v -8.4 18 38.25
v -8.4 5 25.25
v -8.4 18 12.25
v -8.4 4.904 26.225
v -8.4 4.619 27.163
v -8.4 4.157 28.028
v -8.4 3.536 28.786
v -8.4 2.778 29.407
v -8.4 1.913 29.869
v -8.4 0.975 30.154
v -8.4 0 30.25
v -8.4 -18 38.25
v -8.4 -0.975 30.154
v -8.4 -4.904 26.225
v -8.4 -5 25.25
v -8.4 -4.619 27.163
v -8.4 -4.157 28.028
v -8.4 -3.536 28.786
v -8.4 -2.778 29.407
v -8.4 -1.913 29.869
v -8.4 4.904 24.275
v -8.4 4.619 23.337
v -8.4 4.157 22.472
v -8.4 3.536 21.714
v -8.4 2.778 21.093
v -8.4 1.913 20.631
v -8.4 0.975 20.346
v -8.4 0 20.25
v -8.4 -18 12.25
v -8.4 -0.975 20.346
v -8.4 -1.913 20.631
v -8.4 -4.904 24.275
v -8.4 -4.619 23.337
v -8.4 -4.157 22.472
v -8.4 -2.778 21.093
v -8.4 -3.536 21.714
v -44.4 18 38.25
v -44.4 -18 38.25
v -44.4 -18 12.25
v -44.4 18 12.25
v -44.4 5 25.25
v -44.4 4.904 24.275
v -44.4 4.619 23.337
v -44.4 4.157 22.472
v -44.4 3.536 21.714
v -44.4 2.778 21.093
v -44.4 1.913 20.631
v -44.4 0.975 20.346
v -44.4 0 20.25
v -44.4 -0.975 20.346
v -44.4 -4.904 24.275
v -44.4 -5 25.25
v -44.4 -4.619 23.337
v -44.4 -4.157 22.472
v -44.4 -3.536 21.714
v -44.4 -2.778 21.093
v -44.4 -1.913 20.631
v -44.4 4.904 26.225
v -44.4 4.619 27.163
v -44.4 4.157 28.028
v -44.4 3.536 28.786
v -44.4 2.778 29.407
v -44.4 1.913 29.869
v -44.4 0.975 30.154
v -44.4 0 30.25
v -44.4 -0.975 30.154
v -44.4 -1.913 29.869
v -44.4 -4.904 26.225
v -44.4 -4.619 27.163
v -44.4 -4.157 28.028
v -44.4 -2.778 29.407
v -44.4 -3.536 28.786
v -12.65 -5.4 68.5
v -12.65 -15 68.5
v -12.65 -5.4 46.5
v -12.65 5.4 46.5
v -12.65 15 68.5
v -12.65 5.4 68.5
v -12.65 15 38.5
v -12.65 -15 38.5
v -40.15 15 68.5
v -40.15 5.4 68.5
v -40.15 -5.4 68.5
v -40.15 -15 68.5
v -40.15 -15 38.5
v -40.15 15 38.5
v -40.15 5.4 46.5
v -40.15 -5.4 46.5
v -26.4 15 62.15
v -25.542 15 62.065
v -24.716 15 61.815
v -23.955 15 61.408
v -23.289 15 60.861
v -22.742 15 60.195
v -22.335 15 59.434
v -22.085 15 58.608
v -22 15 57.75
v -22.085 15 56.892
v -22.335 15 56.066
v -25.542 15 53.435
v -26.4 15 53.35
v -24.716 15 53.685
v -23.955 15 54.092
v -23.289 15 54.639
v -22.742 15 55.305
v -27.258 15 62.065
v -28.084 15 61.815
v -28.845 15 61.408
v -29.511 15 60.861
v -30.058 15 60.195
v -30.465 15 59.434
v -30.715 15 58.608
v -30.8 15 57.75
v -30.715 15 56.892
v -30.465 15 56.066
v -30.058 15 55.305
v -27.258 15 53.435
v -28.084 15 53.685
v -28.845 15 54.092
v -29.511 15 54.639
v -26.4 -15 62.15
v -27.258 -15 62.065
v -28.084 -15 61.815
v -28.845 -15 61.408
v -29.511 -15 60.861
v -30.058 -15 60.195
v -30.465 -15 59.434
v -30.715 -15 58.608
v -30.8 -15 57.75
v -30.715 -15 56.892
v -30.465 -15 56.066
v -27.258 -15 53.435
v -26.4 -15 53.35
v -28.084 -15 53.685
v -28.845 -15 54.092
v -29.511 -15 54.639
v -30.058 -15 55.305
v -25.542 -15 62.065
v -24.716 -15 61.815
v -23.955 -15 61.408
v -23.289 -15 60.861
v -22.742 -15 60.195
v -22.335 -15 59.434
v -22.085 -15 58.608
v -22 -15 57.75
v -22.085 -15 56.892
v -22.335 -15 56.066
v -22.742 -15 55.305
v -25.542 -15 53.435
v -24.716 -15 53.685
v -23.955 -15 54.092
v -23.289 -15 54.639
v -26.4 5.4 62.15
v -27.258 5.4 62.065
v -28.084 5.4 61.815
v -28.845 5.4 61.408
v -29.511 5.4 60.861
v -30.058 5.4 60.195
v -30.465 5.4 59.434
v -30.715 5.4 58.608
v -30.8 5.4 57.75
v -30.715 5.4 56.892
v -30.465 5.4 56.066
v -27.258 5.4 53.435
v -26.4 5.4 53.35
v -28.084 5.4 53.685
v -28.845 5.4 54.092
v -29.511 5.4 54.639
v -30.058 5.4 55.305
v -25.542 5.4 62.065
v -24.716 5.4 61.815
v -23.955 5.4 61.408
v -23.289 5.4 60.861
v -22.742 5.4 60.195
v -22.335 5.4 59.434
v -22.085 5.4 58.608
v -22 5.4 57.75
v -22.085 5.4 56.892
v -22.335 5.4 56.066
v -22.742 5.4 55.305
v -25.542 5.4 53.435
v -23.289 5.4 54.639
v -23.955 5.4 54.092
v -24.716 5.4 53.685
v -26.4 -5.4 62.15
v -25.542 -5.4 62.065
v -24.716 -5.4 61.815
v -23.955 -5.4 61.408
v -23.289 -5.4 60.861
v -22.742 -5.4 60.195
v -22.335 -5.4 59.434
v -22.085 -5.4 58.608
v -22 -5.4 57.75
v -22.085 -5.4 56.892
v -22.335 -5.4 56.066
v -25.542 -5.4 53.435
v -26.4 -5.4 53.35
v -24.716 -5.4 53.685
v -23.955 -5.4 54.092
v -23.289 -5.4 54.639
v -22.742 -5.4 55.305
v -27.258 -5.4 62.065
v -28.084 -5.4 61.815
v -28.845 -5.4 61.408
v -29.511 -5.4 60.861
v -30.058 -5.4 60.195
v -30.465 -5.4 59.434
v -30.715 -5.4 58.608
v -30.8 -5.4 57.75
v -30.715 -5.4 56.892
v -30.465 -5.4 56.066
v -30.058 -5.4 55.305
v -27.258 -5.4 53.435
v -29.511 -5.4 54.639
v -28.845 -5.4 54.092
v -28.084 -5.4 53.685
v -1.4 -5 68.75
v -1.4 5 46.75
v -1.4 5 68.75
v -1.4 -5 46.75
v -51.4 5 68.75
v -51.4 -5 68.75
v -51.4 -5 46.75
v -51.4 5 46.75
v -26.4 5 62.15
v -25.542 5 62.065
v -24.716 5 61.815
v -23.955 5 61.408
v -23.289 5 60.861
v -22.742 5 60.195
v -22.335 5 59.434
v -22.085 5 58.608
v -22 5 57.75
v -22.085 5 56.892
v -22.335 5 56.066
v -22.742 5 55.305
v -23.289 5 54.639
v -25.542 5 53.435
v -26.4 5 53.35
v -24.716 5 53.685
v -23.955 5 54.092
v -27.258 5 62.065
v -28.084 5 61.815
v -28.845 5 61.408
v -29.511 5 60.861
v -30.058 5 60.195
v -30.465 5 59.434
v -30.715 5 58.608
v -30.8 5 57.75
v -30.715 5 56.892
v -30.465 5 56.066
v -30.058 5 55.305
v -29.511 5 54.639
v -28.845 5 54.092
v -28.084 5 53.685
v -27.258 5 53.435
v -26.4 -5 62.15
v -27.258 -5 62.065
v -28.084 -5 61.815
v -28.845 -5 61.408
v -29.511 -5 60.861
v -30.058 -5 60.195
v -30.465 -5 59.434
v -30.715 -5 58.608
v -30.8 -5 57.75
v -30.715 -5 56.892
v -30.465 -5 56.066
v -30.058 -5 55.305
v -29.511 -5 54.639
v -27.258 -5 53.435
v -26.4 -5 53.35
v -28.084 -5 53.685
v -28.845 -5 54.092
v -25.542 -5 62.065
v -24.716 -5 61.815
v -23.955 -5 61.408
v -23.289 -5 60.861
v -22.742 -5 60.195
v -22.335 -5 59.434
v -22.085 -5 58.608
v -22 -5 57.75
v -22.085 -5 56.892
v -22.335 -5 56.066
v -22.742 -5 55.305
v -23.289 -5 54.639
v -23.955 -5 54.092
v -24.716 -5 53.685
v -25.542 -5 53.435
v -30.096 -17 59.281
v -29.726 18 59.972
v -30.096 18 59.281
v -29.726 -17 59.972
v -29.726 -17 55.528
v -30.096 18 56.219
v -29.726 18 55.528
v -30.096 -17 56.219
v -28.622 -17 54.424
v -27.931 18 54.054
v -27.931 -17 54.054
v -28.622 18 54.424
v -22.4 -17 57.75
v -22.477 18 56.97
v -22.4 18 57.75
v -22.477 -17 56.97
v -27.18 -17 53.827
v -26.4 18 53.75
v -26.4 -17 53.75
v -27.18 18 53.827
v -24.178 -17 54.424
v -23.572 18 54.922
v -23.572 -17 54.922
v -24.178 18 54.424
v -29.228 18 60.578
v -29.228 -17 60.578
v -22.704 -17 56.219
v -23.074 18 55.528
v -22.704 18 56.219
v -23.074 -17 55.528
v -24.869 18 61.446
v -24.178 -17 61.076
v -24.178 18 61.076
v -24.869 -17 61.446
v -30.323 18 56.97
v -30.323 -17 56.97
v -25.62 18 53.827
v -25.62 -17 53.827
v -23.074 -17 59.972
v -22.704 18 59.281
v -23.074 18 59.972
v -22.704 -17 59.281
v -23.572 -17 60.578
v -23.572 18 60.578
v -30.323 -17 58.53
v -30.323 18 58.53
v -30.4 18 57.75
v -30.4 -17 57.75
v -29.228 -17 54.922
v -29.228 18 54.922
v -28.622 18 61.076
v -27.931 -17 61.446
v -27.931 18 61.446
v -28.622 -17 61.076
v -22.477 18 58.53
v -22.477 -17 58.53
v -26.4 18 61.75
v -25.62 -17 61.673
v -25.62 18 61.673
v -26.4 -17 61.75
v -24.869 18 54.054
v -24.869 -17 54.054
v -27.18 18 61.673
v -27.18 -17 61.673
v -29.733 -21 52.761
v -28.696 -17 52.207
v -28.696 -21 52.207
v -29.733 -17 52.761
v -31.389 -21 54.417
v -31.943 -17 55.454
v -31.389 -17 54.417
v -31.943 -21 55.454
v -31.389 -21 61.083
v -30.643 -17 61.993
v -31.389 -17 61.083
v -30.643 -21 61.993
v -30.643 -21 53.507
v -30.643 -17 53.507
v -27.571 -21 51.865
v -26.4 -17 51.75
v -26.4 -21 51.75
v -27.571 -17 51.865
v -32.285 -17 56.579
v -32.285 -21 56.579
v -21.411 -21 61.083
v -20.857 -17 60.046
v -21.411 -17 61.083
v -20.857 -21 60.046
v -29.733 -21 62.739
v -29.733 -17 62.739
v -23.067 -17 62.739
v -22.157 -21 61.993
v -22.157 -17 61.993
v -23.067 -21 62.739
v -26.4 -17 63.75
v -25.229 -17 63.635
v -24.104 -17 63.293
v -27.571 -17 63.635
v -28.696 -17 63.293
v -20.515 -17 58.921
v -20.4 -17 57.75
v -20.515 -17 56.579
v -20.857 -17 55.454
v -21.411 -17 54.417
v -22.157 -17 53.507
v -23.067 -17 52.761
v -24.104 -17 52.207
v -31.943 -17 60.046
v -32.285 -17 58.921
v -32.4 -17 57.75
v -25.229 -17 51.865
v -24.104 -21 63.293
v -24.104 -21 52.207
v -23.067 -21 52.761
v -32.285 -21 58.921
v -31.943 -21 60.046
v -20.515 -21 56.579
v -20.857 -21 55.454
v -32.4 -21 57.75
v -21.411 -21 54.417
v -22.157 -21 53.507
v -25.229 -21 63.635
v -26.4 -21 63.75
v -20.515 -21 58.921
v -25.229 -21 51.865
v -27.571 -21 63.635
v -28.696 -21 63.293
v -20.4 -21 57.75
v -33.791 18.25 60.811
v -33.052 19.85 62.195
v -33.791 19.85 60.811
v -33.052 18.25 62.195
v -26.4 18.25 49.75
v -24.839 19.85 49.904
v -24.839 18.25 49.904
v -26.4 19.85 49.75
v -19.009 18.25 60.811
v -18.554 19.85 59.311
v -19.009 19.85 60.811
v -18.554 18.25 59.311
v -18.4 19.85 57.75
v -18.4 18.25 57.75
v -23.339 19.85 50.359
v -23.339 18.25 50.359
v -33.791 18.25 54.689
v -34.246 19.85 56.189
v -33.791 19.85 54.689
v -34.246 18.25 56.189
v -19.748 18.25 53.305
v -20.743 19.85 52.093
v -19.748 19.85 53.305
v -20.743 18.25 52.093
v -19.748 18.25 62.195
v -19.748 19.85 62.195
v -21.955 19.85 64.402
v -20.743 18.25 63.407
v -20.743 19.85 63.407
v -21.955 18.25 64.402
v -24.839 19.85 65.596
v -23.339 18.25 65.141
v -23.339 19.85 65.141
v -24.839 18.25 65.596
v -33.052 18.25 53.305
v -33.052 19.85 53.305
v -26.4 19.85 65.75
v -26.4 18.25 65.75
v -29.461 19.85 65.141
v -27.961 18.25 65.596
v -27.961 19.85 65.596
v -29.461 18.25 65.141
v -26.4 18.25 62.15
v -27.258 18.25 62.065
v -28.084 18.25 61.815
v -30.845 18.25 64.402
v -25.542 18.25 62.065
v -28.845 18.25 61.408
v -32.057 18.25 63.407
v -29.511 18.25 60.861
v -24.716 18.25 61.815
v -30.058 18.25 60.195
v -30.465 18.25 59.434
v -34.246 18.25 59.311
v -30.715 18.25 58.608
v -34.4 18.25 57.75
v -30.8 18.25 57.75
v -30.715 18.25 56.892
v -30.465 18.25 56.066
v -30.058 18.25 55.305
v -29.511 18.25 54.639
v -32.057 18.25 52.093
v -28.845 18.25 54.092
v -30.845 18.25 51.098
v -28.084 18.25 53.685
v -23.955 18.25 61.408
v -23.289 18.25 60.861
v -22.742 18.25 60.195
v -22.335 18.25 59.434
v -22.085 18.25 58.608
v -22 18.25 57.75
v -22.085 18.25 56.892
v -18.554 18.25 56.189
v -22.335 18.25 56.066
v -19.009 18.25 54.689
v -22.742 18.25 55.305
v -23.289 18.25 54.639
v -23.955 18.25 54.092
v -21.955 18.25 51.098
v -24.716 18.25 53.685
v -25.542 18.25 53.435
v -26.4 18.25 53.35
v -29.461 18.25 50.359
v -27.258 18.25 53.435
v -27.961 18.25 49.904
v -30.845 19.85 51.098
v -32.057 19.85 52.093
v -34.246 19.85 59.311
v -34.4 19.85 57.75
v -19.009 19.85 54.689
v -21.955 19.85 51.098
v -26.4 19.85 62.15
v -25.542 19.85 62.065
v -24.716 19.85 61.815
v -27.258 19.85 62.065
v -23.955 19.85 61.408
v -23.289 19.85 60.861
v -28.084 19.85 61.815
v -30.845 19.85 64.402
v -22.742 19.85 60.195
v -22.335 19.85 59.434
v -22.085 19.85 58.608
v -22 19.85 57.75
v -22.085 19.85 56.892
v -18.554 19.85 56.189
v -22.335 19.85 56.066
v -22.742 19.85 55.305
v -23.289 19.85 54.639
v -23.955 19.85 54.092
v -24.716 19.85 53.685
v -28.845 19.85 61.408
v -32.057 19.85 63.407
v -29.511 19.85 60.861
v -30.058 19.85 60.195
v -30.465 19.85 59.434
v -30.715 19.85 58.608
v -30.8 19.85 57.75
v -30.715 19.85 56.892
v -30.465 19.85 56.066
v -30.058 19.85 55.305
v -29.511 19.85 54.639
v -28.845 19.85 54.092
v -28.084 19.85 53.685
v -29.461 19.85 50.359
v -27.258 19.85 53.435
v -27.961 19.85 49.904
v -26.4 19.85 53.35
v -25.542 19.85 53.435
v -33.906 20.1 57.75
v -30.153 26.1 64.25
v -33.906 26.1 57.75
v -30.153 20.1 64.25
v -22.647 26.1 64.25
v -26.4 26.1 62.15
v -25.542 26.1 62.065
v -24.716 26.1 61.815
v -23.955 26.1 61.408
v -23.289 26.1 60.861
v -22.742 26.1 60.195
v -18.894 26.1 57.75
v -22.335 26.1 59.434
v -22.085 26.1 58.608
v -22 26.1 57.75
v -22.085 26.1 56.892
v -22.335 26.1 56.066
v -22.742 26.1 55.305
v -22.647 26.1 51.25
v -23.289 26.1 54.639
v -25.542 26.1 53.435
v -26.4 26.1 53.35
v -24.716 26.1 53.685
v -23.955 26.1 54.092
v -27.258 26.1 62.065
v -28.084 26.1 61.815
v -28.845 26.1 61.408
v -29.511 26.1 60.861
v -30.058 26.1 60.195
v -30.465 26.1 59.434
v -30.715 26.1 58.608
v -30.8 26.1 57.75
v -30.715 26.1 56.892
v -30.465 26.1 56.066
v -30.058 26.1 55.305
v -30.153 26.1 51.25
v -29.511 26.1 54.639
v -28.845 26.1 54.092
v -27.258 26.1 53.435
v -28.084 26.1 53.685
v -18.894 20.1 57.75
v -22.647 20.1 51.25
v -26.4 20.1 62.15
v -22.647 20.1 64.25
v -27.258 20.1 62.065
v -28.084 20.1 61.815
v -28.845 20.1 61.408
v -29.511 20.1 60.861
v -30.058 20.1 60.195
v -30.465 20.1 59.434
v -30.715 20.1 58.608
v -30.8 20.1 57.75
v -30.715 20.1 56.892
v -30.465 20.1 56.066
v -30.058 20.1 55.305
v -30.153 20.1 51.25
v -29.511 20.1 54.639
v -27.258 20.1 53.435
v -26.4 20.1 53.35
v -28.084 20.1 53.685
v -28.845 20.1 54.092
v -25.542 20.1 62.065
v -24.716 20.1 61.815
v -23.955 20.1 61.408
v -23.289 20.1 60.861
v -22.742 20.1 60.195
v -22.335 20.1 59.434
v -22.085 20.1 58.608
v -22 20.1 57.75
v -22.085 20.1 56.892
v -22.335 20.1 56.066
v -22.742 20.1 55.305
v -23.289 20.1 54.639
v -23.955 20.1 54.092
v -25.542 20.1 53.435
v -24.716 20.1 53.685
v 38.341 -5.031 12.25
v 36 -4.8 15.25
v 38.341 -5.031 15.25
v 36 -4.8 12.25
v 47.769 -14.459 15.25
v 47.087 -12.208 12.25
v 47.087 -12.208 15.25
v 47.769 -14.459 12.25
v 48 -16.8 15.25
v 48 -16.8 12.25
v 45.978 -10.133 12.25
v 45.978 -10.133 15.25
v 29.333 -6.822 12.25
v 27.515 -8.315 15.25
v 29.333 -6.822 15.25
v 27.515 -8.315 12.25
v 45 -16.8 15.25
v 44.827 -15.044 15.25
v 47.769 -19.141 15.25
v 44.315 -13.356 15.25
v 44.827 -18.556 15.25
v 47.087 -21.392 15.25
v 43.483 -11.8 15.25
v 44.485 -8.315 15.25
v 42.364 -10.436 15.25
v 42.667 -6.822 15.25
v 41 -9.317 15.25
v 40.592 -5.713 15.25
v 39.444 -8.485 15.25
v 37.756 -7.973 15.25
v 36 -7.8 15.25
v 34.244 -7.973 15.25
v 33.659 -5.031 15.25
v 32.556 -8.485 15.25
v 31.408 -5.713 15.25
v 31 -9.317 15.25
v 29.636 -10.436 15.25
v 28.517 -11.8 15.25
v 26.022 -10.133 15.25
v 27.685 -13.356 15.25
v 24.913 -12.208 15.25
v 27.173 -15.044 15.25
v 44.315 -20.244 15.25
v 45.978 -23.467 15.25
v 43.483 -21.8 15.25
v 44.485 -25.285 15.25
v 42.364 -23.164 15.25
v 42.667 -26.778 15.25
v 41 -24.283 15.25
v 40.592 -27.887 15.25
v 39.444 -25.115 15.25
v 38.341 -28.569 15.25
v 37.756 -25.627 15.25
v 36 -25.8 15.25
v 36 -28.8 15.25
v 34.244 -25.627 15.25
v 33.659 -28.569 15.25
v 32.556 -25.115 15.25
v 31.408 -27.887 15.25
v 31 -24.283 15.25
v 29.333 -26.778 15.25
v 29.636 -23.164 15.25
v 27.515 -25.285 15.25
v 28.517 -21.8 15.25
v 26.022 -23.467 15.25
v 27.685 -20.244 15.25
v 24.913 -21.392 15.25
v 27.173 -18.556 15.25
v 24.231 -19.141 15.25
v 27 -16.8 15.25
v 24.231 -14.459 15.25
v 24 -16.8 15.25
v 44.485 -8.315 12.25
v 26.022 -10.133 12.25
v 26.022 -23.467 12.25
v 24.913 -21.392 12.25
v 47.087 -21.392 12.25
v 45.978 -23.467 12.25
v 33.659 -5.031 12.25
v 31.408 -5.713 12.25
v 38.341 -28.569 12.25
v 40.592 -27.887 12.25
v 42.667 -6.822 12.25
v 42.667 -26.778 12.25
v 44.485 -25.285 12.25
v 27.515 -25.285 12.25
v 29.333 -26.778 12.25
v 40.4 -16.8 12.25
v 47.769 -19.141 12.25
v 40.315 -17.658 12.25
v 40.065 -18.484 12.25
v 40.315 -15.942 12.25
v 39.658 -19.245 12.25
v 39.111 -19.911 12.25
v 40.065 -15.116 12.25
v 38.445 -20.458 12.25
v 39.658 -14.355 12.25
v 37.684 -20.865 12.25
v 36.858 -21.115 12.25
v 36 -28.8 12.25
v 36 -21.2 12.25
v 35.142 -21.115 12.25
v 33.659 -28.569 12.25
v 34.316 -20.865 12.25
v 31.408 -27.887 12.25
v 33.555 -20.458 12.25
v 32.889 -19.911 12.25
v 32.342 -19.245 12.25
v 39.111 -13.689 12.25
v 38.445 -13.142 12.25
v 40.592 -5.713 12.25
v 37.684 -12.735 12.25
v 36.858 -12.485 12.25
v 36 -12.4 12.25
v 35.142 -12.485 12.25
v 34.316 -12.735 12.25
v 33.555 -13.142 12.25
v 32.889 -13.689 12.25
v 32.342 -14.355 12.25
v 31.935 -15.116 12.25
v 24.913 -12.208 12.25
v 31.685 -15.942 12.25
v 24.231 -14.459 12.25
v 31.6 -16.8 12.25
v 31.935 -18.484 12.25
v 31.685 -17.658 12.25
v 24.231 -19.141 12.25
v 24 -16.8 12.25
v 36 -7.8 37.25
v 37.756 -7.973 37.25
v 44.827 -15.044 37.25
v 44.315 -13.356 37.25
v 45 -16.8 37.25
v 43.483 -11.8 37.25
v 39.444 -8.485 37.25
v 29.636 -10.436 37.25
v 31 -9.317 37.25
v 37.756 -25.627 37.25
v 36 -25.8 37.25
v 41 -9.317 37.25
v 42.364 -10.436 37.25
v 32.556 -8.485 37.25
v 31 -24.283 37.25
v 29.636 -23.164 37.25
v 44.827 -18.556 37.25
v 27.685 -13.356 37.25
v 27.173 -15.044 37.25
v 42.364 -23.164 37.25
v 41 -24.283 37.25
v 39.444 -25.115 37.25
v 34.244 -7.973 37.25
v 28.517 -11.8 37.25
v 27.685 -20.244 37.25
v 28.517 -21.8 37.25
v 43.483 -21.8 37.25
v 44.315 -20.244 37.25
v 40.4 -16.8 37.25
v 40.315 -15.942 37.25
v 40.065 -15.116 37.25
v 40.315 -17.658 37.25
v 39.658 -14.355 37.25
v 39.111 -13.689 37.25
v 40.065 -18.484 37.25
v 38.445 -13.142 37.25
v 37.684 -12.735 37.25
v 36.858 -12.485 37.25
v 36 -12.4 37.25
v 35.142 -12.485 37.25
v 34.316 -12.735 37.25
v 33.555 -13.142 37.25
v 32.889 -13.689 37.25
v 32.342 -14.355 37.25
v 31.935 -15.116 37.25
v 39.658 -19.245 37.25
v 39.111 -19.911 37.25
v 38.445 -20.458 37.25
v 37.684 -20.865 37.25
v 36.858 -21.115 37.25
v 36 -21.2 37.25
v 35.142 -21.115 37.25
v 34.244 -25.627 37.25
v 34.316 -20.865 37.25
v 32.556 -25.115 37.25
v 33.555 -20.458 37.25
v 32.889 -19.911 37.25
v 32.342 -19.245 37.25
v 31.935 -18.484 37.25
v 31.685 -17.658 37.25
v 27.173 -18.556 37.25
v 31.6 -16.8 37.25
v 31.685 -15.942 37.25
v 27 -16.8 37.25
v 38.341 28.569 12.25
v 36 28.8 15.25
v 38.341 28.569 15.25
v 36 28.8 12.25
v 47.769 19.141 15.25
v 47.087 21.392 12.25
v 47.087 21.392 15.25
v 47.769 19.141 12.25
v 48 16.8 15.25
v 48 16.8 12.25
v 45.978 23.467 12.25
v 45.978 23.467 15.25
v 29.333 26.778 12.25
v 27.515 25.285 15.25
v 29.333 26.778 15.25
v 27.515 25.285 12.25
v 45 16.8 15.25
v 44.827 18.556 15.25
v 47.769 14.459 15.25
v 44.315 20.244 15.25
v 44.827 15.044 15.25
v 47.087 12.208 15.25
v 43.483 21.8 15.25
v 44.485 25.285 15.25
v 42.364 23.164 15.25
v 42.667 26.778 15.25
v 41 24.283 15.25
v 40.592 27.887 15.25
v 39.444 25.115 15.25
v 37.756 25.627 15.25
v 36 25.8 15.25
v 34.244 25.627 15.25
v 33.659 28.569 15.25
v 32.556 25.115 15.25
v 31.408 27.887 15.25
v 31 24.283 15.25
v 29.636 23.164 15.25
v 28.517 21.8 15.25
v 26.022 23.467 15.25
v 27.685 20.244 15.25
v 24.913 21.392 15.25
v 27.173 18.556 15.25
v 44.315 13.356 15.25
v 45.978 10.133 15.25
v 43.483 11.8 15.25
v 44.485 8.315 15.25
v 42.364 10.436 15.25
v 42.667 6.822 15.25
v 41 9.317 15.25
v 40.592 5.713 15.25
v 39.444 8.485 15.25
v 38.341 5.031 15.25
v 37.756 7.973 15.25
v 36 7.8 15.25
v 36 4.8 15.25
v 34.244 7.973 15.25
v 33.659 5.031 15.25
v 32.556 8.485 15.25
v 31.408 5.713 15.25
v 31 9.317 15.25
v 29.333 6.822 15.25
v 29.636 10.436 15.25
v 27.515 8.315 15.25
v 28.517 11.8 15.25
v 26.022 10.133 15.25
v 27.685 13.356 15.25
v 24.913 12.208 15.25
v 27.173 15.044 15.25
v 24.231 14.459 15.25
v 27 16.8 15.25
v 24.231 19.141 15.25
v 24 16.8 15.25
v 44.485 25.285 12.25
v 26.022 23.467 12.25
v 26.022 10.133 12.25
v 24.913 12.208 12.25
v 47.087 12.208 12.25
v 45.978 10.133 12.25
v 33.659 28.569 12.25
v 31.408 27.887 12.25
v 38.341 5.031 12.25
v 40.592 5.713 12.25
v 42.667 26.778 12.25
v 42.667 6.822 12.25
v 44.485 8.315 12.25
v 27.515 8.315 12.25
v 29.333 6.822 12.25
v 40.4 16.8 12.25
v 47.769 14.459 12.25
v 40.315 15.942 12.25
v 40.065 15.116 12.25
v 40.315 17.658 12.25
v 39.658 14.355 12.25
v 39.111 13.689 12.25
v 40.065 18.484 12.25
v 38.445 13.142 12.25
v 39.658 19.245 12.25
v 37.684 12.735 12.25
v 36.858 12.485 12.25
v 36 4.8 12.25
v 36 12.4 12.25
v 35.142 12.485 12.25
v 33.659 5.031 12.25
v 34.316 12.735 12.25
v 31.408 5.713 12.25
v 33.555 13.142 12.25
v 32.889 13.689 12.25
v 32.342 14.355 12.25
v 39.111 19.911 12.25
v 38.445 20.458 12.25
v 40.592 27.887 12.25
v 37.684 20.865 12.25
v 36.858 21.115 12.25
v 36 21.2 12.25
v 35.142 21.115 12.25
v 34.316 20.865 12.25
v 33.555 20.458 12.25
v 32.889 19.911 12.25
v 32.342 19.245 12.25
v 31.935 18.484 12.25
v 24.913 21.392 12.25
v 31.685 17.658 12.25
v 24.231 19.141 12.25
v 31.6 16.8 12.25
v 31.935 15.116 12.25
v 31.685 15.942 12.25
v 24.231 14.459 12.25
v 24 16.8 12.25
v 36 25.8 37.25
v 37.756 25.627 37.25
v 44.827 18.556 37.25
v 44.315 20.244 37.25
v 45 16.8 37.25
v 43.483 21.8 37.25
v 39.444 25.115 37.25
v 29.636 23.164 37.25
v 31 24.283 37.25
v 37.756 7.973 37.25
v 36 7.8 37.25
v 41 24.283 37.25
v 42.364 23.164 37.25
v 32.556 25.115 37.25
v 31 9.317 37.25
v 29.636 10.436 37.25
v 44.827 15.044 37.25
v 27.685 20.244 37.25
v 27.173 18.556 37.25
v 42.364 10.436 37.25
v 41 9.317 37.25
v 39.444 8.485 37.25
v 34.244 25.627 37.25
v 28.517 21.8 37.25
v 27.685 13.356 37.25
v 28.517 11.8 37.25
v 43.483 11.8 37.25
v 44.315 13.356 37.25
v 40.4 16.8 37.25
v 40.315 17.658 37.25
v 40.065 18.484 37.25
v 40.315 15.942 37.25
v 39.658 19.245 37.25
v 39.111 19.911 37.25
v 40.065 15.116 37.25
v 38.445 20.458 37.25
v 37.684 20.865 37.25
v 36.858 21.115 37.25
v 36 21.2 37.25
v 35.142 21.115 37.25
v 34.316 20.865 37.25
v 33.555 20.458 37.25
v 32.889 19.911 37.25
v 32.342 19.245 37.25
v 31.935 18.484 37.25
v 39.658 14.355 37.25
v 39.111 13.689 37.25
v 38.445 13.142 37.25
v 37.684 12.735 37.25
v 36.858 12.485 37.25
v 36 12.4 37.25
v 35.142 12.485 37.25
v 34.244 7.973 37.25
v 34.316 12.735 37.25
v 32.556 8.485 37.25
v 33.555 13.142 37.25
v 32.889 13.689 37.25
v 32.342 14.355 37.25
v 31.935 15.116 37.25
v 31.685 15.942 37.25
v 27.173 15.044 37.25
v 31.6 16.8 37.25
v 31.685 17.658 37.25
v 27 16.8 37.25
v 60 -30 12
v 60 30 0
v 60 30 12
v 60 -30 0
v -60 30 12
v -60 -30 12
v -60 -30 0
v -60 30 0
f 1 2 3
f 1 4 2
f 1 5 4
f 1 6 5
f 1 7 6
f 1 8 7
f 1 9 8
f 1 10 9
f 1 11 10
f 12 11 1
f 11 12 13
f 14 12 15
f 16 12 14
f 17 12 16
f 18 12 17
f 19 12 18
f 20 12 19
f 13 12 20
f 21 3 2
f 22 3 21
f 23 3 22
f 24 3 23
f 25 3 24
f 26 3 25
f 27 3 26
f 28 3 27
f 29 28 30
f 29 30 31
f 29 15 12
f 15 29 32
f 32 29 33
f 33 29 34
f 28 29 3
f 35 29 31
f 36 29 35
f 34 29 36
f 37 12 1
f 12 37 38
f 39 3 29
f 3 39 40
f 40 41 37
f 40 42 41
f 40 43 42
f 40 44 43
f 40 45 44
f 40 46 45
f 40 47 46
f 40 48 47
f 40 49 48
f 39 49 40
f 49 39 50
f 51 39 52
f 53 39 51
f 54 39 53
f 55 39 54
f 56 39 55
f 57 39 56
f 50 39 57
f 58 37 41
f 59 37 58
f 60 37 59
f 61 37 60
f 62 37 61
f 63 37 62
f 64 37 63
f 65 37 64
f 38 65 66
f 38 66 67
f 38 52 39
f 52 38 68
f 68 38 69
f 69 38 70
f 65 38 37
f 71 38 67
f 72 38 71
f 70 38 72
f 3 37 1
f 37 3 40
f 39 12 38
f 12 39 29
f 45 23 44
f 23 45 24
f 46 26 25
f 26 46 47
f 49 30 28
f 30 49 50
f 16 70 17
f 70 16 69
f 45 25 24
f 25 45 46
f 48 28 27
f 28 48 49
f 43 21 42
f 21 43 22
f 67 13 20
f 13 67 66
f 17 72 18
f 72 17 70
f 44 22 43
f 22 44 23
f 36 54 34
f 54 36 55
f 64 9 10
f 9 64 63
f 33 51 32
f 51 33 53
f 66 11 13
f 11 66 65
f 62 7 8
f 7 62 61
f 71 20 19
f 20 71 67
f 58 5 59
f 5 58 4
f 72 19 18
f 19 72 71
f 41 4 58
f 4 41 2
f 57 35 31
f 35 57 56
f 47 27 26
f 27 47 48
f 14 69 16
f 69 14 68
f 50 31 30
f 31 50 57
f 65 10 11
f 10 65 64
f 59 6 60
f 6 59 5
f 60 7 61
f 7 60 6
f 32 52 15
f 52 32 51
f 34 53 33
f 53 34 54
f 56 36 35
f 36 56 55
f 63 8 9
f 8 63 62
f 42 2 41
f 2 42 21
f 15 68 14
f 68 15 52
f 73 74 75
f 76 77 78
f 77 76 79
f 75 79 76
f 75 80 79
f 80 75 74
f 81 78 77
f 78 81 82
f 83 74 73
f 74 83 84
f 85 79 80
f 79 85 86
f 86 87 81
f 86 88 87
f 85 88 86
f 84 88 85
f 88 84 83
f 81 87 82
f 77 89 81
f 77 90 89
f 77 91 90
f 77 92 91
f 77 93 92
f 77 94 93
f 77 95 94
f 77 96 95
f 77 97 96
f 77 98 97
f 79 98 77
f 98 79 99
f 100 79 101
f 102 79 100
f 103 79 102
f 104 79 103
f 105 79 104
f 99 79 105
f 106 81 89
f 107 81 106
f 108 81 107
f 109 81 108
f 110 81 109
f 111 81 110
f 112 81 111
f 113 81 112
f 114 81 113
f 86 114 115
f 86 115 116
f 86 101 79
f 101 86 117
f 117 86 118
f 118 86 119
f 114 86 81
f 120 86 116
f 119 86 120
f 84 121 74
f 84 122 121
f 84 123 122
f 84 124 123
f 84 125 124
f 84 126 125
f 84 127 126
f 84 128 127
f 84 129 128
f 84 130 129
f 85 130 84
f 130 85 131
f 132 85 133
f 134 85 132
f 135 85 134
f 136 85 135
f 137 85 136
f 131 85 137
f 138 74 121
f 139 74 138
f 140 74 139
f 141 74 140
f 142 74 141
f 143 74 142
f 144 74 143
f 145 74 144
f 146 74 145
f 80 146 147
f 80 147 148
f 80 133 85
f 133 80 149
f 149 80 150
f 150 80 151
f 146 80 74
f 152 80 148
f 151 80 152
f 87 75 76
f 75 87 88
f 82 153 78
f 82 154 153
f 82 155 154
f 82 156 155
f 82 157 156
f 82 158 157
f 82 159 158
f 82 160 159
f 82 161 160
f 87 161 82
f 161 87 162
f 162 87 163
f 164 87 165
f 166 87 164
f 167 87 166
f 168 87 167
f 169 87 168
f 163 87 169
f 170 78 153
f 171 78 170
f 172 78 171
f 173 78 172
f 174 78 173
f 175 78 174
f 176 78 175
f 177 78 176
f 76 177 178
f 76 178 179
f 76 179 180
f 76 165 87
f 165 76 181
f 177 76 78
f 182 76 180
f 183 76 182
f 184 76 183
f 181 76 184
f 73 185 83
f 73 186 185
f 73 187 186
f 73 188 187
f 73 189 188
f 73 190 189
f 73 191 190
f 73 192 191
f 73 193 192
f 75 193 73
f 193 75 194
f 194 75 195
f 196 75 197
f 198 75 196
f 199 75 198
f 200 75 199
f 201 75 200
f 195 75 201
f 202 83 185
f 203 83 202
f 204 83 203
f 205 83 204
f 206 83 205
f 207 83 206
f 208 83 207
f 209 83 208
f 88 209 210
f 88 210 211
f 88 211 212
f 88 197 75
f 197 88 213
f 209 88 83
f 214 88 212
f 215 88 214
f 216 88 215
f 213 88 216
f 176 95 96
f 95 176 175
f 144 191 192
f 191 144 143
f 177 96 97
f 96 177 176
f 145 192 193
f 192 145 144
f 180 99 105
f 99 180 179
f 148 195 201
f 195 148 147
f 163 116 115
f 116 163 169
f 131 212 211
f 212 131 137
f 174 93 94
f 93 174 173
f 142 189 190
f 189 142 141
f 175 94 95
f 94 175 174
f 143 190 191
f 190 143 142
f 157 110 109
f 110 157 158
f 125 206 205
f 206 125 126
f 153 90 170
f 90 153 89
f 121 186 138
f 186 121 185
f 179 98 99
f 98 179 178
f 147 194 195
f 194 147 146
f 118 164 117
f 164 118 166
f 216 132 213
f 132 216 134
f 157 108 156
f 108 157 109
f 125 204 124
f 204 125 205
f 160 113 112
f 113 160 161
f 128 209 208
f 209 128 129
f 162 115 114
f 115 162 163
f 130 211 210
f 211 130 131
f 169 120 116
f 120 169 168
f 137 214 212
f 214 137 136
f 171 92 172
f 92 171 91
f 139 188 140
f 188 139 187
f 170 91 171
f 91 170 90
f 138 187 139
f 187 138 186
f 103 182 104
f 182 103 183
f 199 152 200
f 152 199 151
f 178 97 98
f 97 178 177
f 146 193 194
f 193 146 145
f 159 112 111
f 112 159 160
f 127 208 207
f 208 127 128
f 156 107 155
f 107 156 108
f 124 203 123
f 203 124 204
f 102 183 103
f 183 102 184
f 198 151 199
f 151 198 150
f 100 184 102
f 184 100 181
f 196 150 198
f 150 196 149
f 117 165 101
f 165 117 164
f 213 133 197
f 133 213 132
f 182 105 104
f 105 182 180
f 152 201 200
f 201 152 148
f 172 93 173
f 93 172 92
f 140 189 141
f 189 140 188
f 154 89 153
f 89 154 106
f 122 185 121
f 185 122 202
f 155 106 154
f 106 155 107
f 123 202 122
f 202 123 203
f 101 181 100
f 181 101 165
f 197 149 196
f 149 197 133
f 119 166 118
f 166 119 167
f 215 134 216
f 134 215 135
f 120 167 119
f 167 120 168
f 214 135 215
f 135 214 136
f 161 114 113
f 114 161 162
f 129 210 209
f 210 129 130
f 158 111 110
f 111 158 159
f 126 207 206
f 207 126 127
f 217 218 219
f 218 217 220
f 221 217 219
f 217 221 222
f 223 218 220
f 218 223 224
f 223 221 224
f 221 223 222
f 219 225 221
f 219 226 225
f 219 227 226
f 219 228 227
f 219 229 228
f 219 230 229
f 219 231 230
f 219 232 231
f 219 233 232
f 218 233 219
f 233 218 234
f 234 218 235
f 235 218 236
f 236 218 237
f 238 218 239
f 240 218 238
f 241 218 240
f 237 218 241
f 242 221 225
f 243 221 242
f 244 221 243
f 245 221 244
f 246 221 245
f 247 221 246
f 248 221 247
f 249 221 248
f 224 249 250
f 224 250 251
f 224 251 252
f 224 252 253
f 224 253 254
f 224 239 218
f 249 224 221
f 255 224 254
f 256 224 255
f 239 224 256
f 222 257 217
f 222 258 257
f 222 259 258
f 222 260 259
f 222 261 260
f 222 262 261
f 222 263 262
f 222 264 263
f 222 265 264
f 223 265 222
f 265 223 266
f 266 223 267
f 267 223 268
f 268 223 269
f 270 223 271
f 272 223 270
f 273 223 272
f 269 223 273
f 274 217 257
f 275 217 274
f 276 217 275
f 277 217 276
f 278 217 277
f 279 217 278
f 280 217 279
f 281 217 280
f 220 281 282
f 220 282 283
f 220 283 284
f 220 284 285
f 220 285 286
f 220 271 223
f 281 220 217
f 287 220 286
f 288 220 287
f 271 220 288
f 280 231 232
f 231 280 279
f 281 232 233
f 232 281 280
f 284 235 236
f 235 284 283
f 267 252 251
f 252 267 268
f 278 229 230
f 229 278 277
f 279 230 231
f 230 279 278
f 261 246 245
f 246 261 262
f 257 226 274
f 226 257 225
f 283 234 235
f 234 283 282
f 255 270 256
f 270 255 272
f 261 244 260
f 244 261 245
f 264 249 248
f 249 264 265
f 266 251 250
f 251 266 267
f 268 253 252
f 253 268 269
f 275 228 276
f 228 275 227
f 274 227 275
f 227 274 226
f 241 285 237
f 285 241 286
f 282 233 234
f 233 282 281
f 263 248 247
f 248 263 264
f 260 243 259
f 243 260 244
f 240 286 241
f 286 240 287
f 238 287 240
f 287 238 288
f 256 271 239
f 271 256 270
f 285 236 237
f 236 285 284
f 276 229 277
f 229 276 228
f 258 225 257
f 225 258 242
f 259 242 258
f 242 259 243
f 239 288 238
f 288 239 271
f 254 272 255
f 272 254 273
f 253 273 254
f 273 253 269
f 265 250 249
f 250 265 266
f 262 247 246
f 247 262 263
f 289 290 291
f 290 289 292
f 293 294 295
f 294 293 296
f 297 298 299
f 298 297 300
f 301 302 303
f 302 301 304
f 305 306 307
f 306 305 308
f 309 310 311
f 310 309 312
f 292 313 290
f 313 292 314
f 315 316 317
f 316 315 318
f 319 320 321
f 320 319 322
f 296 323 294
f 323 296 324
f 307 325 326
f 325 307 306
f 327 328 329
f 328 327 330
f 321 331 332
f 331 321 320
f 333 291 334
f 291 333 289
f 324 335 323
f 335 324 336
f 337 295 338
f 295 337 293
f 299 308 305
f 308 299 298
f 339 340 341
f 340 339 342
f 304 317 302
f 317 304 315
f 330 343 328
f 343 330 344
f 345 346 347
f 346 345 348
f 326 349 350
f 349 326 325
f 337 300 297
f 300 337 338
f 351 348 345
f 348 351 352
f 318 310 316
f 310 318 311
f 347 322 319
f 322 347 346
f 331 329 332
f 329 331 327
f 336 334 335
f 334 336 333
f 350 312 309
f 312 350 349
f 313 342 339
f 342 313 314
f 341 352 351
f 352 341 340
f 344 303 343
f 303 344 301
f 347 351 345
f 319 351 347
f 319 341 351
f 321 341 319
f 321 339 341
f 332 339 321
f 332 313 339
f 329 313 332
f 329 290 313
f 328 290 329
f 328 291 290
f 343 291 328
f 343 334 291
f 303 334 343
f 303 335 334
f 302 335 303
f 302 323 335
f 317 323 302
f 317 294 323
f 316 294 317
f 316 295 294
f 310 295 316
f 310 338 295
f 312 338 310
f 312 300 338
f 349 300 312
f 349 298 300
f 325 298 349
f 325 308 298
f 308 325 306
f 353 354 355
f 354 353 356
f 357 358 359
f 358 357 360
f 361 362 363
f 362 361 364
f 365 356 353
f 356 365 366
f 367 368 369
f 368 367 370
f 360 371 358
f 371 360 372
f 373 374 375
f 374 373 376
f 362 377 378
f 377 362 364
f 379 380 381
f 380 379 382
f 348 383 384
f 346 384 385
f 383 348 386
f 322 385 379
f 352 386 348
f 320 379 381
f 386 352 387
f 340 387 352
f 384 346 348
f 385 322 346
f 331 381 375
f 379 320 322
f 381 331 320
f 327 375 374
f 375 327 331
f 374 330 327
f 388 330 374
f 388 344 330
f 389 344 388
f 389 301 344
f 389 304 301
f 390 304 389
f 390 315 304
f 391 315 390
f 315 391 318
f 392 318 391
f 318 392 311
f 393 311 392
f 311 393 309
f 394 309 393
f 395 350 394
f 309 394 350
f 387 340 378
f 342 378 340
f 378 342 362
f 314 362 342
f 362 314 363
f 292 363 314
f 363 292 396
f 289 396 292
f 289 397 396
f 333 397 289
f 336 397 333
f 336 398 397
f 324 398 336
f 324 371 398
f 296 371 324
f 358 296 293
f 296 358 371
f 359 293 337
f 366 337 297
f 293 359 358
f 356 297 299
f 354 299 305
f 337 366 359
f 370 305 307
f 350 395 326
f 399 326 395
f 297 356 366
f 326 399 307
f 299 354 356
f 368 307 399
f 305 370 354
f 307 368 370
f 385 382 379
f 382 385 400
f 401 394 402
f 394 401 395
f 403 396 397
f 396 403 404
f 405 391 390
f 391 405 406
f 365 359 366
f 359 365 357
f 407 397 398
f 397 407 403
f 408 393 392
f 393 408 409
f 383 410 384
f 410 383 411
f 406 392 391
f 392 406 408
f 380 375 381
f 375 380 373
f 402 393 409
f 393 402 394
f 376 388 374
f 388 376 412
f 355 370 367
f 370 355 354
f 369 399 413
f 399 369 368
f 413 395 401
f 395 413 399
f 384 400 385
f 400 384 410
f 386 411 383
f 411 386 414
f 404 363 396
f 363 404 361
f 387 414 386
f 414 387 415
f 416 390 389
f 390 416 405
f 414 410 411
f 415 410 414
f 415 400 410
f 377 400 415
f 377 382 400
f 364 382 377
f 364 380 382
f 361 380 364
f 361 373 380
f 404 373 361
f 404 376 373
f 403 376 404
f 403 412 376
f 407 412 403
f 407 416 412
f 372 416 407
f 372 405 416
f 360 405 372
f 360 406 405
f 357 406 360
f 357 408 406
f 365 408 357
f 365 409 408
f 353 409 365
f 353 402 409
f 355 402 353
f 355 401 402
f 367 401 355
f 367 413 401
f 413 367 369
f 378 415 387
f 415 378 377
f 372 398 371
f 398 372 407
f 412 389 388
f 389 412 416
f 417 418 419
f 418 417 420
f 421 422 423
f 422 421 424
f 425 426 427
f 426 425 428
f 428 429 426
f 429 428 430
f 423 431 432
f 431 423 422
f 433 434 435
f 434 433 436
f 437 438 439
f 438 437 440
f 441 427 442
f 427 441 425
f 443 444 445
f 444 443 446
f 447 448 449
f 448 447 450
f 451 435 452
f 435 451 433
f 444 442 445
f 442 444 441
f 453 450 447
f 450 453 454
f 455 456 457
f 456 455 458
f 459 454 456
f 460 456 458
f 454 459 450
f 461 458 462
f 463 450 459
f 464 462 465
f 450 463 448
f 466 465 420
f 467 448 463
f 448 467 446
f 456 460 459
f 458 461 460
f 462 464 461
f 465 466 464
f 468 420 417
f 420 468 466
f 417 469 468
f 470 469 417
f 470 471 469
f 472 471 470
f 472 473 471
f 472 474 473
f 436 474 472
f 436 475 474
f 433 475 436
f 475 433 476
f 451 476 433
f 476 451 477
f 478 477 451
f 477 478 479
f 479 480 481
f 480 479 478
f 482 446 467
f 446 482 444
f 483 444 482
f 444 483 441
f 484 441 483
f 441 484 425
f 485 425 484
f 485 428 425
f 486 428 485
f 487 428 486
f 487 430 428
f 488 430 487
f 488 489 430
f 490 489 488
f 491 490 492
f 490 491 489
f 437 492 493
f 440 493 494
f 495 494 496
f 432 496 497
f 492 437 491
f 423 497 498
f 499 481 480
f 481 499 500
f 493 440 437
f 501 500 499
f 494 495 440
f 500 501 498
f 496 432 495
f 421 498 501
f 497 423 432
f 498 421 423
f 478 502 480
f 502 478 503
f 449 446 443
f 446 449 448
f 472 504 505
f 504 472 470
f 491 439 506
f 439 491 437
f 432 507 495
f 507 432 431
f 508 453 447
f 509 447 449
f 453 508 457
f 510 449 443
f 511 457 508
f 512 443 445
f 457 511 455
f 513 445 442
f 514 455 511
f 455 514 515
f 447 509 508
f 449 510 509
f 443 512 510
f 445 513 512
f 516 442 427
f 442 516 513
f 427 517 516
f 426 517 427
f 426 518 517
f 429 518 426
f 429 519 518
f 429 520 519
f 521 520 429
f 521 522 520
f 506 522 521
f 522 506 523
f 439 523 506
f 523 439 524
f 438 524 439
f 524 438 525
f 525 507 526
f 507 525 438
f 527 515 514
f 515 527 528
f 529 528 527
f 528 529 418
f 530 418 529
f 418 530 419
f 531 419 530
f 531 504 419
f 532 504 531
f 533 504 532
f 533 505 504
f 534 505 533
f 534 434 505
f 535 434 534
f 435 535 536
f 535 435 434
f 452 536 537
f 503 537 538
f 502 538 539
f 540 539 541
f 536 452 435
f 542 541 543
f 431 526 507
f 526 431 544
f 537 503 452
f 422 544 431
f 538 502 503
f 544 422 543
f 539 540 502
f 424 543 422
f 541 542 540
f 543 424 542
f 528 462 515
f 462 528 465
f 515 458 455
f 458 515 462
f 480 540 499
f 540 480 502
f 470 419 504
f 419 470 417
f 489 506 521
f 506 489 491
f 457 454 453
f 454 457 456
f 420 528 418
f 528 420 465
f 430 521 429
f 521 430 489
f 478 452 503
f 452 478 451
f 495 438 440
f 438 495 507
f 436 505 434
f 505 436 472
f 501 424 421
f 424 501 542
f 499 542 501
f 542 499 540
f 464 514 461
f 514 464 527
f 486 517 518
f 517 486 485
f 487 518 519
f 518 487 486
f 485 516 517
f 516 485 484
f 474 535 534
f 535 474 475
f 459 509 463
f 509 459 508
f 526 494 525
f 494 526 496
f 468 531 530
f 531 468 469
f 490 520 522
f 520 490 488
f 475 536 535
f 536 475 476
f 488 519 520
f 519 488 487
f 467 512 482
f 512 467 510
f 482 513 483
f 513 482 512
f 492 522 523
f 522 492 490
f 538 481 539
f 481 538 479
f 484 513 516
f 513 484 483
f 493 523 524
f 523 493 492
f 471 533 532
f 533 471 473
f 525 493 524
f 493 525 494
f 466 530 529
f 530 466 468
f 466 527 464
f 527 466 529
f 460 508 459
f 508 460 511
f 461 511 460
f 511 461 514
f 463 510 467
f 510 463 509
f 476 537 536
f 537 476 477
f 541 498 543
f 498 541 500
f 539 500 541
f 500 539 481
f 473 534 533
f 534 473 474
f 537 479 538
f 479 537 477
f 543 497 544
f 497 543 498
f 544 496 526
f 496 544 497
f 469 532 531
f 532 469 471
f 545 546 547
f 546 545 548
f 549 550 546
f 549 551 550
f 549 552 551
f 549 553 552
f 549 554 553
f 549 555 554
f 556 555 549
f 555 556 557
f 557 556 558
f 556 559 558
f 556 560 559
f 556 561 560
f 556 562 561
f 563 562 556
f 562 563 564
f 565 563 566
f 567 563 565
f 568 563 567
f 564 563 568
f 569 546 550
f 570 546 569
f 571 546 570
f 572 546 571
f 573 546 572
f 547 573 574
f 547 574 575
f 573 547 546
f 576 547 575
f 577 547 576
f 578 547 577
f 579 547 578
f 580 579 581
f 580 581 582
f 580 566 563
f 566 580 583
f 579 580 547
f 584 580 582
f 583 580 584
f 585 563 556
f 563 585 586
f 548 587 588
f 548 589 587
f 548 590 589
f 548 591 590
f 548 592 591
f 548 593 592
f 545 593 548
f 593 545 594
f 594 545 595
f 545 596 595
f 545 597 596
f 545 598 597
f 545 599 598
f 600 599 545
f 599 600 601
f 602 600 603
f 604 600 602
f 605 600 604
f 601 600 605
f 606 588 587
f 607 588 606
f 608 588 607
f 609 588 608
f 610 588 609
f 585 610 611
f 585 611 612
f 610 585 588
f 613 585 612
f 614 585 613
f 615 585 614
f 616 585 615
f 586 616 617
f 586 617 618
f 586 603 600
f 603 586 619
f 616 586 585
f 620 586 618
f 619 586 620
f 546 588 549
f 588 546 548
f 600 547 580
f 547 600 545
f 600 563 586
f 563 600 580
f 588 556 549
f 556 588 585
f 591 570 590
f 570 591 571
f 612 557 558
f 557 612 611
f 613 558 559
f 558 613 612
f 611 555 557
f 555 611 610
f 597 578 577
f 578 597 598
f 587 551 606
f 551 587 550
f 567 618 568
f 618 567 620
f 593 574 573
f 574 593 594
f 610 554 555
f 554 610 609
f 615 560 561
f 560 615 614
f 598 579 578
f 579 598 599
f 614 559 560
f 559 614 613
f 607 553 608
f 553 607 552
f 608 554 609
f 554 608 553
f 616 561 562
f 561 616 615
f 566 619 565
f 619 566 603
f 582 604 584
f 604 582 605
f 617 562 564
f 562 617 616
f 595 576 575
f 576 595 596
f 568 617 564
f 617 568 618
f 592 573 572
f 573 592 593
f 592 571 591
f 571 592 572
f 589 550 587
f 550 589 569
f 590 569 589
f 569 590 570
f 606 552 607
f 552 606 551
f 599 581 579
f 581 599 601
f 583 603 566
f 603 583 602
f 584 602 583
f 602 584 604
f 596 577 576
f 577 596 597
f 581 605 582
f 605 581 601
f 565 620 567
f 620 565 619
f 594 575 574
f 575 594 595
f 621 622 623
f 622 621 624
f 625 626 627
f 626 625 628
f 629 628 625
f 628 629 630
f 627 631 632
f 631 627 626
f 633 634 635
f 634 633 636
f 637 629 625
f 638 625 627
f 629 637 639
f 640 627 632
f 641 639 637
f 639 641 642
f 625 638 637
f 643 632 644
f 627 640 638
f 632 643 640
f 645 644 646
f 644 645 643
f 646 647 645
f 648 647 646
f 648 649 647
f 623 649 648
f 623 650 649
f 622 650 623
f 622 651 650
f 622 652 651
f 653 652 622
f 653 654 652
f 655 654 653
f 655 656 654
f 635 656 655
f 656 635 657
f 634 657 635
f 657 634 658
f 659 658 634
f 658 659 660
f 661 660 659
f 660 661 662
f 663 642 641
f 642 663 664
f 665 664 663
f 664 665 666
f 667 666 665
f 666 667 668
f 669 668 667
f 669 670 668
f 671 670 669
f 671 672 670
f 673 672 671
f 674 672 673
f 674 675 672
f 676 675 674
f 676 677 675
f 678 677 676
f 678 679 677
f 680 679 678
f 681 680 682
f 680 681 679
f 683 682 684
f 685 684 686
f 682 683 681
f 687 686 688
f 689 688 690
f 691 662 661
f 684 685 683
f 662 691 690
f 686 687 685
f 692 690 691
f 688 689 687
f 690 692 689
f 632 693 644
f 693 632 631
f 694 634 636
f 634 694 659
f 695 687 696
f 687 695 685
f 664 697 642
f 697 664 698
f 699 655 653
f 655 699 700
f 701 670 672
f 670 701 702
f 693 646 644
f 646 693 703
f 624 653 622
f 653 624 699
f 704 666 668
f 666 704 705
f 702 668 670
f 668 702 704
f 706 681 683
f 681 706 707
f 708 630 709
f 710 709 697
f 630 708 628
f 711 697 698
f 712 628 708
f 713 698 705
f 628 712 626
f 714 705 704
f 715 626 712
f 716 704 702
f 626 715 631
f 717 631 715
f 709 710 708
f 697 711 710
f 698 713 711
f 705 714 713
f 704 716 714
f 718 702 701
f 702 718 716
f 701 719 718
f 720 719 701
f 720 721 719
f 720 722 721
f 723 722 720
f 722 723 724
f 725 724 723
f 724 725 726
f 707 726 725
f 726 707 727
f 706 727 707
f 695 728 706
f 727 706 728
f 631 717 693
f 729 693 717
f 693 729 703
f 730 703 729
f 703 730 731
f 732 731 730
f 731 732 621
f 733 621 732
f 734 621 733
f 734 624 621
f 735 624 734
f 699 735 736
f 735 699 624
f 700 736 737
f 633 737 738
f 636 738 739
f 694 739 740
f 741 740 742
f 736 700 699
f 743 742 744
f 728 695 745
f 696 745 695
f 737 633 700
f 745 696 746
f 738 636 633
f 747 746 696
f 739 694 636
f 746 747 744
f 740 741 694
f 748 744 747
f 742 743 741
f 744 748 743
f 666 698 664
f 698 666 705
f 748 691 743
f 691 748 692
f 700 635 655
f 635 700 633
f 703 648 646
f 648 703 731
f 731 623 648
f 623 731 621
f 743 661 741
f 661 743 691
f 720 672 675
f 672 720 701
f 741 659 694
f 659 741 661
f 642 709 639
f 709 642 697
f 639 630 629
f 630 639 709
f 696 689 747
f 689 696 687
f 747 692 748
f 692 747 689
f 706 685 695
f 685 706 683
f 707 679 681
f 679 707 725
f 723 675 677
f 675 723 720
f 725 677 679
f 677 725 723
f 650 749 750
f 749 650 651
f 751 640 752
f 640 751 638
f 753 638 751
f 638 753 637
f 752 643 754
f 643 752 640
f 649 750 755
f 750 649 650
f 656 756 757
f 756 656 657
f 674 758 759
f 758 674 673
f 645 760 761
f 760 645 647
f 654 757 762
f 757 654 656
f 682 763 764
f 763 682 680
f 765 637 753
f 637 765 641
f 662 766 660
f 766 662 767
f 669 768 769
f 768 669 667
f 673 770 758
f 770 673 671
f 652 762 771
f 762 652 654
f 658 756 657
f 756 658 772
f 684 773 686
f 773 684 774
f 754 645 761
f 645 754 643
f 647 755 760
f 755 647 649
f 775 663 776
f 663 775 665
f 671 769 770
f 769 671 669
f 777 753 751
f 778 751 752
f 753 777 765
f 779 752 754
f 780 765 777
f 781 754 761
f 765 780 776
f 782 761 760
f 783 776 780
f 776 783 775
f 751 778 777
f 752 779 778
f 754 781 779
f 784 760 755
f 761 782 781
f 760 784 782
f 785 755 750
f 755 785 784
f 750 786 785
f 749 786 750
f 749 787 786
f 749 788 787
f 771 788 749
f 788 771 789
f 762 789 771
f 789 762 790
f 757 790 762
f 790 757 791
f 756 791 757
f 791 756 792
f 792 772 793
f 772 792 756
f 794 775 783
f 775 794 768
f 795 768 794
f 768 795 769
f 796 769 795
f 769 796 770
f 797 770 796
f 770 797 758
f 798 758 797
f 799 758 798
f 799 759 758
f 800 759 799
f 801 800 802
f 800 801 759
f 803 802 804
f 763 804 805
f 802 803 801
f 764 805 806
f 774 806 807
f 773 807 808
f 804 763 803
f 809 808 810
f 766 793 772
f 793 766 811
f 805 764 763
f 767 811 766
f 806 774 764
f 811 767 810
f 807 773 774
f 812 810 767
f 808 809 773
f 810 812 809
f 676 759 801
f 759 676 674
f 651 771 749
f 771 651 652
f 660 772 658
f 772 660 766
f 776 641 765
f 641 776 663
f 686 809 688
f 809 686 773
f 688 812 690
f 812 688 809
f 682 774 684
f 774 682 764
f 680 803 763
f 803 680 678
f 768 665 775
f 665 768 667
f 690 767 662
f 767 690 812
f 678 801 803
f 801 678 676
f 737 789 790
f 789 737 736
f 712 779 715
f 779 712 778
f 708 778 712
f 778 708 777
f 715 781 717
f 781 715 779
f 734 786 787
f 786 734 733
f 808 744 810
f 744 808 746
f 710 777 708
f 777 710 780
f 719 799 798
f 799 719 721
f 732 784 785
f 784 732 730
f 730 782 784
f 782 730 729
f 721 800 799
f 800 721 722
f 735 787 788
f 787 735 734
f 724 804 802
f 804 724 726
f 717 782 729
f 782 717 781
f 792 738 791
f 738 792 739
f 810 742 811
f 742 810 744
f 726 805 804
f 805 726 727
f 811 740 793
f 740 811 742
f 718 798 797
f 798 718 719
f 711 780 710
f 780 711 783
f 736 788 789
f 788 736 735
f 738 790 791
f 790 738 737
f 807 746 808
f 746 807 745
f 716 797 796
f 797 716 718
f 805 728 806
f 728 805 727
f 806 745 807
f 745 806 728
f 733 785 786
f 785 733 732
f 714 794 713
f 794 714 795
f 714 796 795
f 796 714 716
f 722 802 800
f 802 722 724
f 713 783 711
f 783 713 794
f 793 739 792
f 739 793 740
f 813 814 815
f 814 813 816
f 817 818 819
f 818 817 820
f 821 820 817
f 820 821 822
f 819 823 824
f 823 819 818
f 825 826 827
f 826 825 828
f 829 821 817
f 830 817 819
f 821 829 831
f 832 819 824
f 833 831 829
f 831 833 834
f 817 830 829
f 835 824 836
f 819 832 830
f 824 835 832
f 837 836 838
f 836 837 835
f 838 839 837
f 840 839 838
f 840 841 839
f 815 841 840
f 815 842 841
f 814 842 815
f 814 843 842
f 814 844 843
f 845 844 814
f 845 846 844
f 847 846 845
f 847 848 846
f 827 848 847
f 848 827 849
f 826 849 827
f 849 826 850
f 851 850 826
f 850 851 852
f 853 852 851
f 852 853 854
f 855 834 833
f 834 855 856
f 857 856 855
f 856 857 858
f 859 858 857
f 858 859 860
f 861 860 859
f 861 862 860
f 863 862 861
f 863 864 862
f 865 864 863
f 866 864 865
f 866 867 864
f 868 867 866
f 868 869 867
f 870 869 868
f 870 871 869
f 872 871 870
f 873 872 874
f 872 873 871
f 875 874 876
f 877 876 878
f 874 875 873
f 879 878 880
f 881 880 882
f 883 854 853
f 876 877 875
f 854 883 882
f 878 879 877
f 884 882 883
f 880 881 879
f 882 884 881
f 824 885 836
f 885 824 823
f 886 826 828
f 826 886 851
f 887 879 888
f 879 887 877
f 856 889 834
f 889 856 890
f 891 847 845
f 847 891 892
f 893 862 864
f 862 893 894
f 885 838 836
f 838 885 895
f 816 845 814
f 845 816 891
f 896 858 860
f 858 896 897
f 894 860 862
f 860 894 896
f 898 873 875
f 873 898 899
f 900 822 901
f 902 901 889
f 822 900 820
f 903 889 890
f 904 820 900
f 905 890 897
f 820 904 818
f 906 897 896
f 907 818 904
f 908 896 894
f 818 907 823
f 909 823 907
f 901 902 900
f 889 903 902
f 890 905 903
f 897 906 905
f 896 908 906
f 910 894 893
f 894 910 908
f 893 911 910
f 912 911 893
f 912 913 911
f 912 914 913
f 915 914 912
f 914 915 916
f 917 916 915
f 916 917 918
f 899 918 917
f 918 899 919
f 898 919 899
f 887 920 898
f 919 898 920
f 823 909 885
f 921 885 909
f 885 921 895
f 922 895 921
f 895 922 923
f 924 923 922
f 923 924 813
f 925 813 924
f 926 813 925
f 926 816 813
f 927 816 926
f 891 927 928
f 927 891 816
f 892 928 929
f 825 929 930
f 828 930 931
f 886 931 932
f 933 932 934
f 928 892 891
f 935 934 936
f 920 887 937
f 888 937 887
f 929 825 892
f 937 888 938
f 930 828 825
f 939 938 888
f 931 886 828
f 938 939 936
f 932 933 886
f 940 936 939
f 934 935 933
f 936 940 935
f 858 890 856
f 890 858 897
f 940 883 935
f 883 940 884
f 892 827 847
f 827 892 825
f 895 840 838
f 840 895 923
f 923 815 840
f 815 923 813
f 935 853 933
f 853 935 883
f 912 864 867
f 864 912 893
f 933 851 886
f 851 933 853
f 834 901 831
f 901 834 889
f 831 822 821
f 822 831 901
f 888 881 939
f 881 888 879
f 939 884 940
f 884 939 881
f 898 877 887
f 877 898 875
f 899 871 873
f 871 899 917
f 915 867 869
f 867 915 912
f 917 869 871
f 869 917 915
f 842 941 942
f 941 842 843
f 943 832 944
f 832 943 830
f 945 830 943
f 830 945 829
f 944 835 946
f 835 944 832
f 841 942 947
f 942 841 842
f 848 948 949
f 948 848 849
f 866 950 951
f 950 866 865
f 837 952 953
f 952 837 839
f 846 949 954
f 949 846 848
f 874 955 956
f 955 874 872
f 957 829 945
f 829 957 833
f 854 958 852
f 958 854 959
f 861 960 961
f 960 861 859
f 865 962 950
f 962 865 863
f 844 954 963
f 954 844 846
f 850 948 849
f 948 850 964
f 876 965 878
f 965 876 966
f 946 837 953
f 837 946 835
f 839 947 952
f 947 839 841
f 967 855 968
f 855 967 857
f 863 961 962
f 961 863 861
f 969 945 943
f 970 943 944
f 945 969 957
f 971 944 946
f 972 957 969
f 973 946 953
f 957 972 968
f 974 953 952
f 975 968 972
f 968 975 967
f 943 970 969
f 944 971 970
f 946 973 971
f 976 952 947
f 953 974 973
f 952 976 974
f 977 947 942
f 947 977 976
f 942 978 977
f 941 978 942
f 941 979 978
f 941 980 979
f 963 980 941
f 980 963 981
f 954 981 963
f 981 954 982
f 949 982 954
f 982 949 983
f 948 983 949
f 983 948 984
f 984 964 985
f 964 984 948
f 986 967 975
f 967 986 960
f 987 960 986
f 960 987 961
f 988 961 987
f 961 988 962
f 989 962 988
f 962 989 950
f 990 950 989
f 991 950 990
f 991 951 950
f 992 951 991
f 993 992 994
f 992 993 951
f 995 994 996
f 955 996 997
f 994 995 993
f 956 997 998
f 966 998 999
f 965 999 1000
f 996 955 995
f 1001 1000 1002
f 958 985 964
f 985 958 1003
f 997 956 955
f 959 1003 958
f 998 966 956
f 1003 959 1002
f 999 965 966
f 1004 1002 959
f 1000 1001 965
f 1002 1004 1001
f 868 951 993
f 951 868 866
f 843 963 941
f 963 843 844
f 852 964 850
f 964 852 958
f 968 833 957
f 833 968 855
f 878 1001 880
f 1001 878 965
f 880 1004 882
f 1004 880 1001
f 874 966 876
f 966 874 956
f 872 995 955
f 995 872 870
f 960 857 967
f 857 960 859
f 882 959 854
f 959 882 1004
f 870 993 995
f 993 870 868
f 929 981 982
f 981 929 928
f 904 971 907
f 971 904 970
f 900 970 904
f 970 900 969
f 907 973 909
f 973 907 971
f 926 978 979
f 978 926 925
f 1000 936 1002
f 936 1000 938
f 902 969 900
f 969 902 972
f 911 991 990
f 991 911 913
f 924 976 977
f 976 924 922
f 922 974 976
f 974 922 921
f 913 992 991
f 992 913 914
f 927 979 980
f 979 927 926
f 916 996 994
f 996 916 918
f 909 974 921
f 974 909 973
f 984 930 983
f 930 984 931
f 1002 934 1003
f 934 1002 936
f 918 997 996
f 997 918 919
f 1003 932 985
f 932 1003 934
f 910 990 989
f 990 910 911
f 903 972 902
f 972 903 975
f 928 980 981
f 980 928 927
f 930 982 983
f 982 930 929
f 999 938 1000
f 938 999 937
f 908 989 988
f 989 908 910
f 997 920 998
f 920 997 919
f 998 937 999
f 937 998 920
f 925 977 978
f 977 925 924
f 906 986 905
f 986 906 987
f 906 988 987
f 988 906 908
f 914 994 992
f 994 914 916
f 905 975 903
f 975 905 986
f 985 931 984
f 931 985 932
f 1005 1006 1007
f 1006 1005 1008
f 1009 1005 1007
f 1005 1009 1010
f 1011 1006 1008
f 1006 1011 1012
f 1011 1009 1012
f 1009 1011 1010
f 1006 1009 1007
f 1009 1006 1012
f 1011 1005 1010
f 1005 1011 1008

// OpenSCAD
$fn = 32;

// ------------------------------------------------------------------------
// Indexing jig: plate 120 x 60 mm, pin d8
// Every part is its own module, assembly() places every instance.
// ------------------------------------------------------------------------

// --- part 1 ---
module jig_plate() {
  difference() {
    translate([-60, -30, 0]) cube([120, 60, 12]);
  }
}

// --- part 2 ---
module locator_block() {
  difference() {
    translate([-18, -18, 0]) cube([36, 36, 26]);
    translate([0, 0, 13]) rotate([0, 90, 0]) cylinder(h = 38, d = 10, center = true);
  }
}

// --- part 3 ---
module index_fork() {
  difference() {
    translate([-13.75, -15, 0]) cube([27.5, 30, 30]);
    translate([-14.75, -5.4, 8]) cube([29.5, 10.8, 23]);
    translate([0, 0, 19.25]) rotate([90, 0, 0]) cylinder(h = 32, d = 8.8, center = true);
  }
}

// --- part 4 ---
module index_arm() {
  difference() {
    translate([-25, -5, 0]) cube([50, 10, 22]);
    translate([0, 0, 11]) rotate([90, 0, 0]) cylinder(h = 12, d = 8.8, center = true);
  }
}

// --- part 5 ---
module index_pin() {
  rotate([0, 90, 0]) cylinder(h = 36, d = 8, center = true);
  translate([-21, 0, 0]) rotate([0, 90, 0]) cylinder(h = 4, d = 12);
}

// --- part 6 ---
module pin_washer() {
  difference() {
      translate([0, 0, 0]) cylinder(h = 1.6, d = 16);
      translate([0, 0, -1]) cylinder(h = 3.6, d = 8.8);
    }
}

// --- part 7 ---
module lock_nut() {
  difference() {
    linear_extrude(height = 6) polygon(points = [[7.506, 0], [3.753, 6.5], [-3.753, 6.5], [-7.506, 0], [-3.753, -6.5], [3.753, -6.5]]);
    translate([0, 0, -1]) cylinder(h = 8, d = 8.8);
  }
}

// --- part 8 ---
module guide_bush_a() {
  difference() {
    union() {
      cylinder(h = 3, d = 24);
      translate([0, 0, 3]) cylinder(h = 22, d = 18);
    }
    translate([0, 0, -1]) cylinder(h = 27, d = 8.8);
  }
}

// --- part 9 ---
module guide_bush_b() {
  difference() {
    union() {
      cylinder(h = 3, d = 24);
      translate([0, 0, 3]) cylinder(h = 22, d = 18);
    }
    translate([0, 0, -1]) cylinder(h = 27, d = 8.8);
  }
}

// --- assembly ---
module assembly() {
  color([0.80, 0.24, 0.20]) translate([0, 0, 0]) rotate([0, 0, 0]) jig_plate();
  color([0.20, 0.45, 0.75]) translate([-26.4, 0, 12.25]) rotate([0, 0, 0]) locator_block();
  color([0.25, 0.62, 0.32]) translate([-26.4, 0, 38.5]) rotate([0, 0, 0]) index_fork();
  color([0.92, 0.70, 0.18]) translate([-26.4, 0, 46.75]) rotate([0, 0, 0]) index_arm();
  color([0.58, 0.35, 0.70]) translate([-26.4, 0, 57.75]) rotate([0, 0, 90]) index_pin();
  color([0.16, 0.66, 0.66]) translate([-26.4, 19.85, 57.75]) rotate([90, 0, 0]) pin_washer();
  color([0.85, 0.48, 0.18]) translate([-26.4, 26.1, 57.75]) rotate([90, 0, 0]) lock_nut();
  color([0.55, 0.60, 0.65]) translate([36, -16.8, 12.25]) rotate([0, 0, 0]) guide_bush_a();
  color([0.75, 0.30, 0.55]) translate([36, 16.8, 12.25]) rotate([0, 0, 0]) guide_bush_b();
}

assembly();
